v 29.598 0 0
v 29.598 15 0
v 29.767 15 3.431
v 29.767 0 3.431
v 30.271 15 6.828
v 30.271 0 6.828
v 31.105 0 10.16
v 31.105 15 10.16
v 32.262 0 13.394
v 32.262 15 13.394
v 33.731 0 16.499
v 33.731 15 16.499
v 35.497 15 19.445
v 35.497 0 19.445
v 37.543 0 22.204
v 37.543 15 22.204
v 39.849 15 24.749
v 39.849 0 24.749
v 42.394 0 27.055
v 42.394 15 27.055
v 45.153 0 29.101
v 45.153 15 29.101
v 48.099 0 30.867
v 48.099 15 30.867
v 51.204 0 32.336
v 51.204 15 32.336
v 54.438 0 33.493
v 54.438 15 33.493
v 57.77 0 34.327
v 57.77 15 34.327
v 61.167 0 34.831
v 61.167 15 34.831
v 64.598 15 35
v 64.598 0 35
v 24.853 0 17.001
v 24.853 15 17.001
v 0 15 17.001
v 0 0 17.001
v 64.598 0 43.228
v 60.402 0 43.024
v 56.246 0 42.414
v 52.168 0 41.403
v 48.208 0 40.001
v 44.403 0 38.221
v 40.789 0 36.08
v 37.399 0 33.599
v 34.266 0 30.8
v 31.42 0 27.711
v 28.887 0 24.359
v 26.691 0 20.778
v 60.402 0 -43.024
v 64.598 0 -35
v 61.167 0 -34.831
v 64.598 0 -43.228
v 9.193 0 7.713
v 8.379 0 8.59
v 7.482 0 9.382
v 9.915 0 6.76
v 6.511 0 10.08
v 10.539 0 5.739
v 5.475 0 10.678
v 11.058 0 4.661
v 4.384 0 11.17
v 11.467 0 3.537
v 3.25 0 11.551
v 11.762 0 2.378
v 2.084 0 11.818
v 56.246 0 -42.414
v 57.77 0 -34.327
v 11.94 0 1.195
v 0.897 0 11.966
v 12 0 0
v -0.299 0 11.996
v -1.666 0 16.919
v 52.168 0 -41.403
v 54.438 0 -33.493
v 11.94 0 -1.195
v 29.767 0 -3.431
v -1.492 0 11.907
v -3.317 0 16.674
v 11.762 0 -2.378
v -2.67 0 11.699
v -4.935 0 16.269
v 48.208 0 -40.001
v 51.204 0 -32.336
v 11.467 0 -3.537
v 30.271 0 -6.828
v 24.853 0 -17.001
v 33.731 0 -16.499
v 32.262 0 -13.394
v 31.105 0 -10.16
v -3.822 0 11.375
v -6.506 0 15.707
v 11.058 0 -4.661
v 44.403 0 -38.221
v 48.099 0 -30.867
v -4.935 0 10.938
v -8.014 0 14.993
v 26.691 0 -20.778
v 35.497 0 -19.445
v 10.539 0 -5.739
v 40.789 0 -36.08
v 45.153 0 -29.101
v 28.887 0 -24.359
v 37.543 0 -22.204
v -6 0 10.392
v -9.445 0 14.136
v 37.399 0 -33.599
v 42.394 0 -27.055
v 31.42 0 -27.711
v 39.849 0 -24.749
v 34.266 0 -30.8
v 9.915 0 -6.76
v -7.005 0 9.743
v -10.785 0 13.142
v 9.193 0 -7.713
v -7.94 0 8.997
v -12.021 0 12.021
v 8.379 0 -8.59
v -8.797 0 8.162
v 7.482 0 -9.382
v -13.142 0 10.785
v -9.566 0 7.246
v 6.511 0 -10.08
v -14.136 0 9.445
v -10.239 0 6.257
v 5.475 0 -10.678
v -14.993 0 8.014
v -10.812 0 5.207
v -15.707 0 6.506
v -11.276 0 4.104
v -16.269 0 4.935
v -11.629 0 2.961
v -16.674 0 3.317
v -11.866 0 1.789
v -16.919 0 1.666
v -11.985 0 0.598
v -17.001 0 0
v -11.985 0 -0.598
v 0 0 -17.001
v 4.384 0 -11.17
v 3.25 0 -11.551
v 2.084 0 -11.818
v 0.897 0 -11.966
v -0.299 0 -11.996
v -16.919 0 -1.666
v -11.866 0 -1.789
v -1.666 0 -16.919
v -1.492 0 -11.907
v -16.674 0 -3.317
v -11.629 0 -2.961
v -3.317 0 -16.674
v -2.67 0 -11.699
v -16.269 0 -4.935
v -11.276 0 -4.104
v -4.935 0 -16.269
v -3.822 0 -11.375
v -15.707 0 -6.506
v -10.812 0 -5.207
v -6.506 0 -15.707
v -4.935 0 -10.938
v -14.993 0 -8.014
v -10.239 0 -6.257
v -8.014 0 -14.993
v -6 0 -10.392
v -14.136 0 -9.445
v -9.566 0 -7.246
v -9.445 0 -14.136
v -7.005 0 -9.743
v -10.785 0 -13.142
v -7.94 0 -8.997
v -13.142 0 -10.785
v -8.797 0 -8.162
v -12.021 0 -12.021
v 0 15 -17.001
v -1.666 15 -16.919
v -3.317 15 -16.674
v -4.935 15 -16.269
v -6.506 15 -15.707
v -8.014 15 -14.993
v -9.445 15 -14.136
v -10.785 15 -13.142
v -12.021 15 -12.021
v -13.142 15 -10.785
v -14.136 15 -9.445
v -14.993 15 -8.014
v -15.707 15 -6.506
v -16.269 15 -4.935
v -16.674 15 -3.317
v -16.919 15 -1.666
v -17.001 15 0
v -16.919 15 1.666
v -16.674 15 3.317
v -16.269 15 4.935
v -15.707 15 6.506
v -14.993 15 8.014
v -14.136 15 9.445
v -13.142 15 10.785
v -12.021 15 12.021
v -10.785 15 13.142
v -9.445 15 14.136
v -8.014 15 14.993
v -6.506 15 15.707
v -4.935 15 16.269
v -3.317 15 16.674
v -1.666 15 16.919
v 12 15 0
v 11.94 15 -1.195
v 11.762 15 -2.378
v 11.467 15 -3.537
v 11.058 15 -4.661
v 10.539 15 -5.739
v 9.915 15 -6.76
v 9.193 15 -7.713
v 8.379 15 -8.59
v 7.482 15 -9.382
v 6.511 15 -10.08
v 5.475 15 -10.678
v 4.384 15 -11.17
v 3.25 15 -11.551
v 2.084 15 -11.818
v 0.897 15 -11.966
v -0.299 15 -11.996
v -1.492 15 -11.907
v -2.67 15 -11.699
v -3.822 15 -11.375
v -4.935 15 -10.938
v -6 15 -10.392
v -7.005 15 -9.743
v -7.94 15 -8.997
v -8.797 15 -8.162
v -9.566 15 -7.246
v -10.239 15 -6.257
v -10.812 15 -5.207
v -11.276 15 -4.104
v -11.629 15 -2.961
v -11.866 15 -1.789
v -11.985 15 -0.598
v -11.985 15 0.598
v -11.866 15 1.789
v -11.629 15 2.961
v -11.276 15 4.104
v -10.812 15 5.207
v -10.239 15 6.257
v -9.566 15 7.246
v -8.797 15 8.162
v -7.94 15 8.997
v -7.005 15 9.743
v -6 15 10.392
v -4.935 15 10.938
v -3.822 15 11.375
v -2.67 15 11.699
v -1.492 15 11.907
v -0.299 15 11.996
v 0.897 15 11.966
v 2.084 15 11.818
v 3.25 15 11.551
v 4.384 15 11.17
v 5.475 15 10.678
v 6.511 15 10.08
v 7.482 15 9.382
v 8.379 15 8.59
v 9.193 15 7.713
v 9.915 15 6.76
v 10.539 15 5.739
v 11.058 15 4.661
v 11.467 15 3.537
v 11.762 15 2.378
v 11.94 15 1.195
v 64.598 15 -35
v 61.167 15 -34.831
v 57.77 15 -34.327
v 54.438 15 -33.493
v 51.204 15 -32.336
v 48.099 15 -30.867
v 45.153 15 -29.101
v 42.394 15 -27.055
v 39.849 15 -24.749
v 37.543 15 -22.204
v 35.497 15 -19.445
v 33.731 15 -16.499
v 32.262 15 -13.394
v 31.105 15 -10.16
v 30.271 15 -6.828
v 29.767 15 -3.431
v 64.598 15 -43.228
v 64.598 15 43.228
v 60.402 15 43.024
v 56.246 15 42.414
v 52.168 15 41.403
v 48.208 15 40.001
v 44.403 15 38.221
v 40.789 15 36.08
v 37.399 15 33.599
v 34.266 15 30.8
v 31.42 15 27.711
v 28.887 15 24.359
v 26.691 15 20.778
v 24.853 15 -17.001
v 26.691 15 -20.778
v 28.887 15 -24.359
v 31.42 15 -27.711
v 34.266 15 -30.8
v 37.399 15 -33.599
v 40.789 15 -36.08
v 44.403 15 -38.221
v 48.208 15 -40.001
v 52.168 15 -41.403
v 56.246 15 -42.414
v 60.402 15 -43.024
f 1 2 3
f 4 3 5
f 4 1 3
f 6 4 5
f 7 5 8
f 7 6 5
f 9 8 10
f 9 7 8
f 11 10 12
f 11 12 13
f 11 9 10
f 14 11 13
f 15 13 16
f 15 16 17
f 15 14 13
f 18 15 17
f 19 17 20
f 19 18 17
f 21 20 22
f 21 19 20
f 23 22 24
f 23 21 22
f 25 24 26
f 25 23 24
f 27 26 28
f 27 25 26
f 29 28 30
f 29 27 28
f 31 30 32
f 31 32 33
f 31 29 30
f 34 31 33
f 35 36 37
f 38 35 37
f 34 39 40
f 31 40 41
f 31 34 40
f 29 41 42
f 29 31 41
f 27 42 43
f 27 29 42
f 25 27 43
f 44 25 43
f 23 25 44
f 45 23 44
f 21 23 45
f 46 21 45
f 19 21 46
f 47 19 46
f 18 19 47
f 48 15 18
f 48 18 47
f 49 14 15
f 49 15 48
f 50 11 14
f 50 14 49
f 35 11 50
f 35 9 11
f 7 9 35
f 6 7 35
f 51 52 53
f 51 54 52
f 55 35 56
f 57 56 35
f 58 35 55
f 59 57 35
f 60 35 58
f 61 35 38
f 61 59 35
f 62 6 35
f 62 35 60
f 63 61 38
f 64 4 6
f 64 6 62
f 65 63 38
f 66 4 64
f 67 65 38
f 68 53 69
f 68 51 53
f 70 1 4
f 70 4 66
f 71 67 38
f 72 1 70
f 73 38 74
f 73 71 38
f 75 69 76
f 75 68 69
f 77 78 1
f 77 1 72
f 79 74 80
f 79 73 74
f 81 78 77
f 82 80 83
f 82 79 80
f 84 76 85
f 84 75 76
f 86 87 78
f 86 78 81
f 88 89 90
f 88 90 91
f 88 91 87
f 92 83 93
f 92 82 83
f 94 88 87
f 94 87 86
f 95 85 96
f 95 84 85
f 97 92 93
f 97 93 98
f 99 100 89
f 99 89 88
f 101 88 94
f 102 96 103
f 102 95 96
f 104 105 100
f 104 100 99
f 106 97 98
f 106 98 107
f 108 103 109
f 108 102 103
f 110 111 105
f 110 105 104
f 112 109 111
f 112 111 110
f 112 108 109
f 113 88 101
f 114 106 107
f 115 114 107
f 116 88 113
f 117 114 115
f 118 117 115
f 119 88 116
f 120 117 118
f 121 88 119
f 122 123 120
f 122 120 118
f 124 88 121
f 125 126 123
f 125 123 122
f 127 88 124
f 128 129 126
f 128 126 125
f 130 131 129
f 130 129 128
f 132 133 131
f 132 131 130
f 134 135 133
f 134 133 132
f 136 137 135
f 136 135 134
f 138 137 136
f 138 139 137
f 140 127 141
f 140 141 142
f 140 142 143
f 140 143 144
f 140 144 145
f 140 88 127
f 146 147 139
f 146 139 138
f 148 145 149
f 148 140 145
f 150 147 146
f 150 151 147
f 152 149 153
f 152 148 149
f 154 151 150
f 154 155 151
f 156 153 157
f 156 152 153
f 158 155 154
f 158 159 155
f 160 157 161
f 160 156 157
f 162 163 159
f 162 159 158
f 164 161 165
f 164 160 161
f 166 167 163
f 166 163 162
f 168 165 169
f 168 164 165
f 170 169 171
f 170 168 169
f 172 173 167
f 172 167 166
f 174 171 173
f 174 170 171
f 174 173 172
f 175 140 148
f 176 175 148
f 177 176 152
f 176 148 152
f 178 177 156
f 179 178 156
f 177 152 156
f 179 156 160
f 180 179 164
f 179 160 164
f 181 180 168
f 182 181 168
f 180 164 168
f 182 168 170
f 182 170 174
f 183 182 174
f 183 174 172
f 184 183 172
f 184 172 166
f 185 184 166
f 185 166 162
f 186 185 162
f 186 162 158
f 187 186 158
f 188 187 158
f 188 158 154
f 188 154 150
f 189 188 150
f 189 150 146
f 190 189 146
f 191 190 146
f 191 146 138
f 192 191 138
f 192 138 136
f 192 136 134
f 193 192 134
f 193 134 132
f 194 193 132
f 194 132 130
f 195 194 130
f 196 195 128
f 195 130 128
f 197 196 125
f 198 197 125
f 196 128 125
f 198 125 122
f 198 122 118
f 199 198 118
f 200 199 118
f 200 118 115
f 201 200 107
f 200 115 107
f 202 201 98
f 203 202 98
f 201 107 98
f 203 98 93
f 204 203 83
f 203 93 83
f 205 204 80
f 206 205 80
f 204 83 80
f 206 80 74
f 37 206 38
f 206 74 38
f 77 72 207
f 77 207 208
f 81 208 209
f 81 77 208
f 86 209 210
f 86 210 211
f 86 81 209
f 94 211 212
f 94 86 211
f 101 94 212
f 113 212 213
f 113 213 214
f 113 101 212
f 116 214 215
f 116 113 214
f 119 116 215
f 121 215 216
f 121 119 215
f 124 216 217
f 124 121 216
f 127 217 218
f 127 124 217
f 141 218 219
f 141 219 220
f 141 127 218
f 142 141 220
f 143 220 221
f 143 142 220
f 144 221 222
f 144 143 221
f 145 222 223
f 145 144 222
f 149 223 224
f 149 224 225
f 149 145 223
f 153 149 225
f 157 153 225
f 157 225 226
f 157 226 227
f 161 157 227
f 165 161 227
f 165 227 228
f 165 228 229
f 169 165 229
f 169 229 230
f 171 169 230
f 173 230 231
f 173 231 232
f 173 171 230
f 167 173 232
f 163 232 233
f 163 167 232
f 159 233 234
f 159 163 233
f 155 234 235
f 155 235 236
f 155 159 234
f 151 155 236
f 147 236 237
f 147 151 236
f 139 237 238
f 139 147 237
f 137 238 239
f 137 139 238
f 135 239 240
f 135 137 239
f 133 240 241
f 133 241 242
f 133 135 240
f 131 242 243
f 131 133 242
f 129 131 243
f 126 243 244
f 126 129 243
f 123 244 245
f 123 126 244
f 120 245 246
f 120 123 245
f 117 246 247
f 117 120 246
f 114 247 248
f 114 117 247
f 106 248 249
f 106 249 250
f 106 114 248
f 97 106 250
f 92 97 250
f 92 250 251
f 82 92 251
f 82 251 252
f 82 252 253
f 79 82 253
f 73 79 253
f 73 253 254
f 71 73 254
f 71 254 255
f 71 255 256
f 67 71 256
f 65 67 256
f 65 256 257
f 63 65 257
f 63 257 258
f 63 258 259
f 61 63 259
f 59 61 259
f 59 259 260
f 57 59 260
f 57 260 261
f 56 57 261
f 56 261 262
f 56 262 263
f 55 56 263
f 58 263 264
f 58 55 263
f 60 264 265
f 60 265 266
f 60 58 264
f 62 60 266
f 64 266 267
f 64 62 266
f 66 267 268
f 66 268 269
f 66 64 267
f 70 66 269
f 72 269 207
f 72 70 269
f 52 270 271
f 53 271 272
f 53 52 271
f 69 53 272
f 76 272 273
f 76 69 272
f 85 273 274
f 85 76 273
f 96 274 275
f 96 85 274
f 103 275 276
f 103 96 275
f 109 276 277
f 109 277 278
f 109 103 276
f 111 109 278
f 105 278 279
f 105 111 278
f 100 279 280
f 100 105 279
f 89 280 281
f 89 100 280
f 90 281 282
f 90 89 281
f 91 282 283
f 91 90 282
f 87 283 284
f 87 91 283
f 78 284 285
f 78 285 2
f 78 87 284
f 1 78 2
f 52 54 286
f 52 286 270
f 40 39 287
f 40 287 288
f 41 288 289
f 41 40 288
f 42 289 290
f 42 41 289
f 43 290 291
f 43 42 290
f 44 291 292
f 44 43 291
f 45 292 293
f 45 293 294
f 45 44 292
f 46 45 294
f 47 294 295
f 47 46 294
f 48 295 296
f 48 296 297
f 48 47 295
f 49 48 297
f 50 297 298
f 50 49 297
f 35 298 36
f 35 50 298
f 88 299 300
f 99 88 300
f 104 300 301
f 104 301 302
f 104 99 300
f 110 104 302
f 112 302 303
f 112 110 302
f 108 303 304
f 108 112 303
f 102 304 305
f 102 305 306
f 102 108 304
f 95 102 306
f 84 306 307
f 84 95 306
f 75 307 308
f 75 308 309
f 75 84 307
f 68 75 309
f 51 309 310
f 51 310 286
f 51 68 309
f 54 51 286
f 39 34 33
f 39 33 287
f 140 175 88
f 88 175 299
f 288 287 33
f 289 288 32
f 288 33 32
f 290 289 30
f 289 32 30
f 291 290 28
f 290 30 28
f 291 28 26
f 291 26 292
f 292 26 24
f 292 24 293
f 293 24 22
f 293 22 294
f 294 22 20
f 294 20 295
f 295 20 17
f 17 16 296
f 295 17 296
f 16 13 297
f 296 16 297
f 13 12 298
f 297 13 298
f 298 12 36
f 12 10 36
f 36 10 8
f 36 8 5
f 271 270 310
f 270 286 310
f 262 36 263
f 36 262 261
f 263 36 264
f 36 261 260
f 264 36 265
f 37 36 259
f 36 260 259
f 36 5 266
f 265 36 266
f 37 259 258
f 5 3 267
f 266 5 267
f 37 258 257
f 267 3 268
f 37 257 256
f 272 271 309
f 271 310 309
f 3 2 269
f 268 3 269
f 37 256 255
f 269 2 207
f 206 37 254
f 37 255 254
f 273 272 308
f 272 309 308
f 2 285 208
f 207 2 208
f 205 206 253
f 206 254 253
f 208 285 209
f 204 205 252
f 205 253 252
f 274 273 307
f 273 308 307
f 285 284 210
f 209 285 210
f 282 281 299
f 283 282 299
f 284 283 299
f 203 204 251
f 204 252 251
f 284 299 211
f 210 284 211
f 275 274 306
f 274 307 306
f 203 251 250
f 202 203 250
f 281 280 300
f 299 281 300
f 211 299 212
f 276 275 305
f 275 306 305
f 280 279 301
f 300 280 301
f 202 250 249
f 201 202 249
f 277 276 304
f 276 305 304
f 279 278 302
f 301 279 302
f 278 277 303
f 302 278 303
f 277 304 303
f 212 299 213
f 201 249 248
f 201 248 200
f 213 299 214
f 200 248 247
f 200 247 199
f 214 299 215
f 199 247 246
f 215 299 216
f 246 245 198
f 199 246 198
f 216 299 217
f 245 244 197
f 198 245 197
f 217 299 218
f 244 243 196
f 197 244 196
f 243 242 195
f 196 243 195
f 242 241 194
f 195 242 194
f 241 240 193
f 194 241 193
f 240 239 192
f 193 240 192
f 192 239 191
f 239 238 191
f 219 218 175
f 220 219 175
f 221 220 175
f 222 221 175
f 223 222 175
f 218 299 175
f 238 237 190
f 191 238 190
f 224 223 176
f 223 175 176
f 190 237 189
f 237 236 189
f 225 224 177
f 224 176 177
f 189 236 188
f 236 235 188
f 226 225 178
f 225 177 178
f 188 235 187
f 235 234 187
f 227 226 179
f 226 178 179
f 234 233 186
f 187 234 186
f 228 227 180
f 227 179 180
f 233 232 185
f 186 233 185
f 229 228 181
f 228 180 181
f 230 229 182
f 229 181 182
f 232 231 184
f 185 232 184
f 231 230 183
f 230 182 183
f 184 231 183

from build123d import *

# Parameters (mm, degrees)
SKETCH1_R           = 17.000673514
SKETCH1_R_2         = 12
BOSS_EXTRUDE1_DEPTH = 15
BOSS_EXTRUDE2_DEPTH = 15
BOSS_EXTRUDE3_DEPTH = 15


with BuildPart() as part:
    # Sketch1 → Boss-Extrude1 (new body)
    with BuildSketch(Plane(origin=(0, 0, 0), x_dir=(1, 0, 0), z_dir=(0, 1, 0))):
        Circle(SKETCH1_R)
        Circle(SKETCH1_R_2, mode=Mode.SUBTRACT)
    extrude(amount=BOSS_EXTRUDE1_DEPTH)

    # Sketch2 → Boss-Extrude2 (add)
    with BuildSketch(Plane(origin=(0, 15, 0), x_dir=(1, 0, 0), z_dir=(0, 1, 0))):
        with BuildLine():
            Line((0, 17.000673514), (25, 17.000673514))
            Line((25, 17.000673514), (25, -17.000673514))
            Line((25, -17.000673514), (0, -17.000673514))
            ThreePointArc((0, -17.000673514), (17.000673514, 0), (0, 17.000673514))
        make_face()
    extrude(amount=-BOSS_EXTRUDE2_DEPTH)

    # Sketch3 → Boss-Extrude3 (add)
    with BuildSketch(Plane(origin=(0, 0, 0), x_dir=(-1, 0, 0), z_dir=(0, -1, 0))):
        with BuildLine():
            ThreePointArc((-29.598035728, 0), (-39.849298386, -24.748737342), (-64.598035728, -35))
            Line((-64.598035728, -35), (-64.598035728, -43.228194221))
            ThreePointArc((-64.598035728, -43.228194221), (-34.031086456, -30.566949272), (-21.369841507, 0))
            ThreePointArc((-21.369841507, 0), (-34.031086456, 30.566949272), (-64.598035728, 43.228194221))
            Line((-64.598035728, 43.228194221), (-64.598035728, 35))
            ThreePointArc((-64.598035728, 35), (-39.849298386, 24.748737342), (-29.598035728, 0))
        make_face()
    extrude(amount=-BOSS_EXTRUDE3_DEPTH)


solid = part.part
